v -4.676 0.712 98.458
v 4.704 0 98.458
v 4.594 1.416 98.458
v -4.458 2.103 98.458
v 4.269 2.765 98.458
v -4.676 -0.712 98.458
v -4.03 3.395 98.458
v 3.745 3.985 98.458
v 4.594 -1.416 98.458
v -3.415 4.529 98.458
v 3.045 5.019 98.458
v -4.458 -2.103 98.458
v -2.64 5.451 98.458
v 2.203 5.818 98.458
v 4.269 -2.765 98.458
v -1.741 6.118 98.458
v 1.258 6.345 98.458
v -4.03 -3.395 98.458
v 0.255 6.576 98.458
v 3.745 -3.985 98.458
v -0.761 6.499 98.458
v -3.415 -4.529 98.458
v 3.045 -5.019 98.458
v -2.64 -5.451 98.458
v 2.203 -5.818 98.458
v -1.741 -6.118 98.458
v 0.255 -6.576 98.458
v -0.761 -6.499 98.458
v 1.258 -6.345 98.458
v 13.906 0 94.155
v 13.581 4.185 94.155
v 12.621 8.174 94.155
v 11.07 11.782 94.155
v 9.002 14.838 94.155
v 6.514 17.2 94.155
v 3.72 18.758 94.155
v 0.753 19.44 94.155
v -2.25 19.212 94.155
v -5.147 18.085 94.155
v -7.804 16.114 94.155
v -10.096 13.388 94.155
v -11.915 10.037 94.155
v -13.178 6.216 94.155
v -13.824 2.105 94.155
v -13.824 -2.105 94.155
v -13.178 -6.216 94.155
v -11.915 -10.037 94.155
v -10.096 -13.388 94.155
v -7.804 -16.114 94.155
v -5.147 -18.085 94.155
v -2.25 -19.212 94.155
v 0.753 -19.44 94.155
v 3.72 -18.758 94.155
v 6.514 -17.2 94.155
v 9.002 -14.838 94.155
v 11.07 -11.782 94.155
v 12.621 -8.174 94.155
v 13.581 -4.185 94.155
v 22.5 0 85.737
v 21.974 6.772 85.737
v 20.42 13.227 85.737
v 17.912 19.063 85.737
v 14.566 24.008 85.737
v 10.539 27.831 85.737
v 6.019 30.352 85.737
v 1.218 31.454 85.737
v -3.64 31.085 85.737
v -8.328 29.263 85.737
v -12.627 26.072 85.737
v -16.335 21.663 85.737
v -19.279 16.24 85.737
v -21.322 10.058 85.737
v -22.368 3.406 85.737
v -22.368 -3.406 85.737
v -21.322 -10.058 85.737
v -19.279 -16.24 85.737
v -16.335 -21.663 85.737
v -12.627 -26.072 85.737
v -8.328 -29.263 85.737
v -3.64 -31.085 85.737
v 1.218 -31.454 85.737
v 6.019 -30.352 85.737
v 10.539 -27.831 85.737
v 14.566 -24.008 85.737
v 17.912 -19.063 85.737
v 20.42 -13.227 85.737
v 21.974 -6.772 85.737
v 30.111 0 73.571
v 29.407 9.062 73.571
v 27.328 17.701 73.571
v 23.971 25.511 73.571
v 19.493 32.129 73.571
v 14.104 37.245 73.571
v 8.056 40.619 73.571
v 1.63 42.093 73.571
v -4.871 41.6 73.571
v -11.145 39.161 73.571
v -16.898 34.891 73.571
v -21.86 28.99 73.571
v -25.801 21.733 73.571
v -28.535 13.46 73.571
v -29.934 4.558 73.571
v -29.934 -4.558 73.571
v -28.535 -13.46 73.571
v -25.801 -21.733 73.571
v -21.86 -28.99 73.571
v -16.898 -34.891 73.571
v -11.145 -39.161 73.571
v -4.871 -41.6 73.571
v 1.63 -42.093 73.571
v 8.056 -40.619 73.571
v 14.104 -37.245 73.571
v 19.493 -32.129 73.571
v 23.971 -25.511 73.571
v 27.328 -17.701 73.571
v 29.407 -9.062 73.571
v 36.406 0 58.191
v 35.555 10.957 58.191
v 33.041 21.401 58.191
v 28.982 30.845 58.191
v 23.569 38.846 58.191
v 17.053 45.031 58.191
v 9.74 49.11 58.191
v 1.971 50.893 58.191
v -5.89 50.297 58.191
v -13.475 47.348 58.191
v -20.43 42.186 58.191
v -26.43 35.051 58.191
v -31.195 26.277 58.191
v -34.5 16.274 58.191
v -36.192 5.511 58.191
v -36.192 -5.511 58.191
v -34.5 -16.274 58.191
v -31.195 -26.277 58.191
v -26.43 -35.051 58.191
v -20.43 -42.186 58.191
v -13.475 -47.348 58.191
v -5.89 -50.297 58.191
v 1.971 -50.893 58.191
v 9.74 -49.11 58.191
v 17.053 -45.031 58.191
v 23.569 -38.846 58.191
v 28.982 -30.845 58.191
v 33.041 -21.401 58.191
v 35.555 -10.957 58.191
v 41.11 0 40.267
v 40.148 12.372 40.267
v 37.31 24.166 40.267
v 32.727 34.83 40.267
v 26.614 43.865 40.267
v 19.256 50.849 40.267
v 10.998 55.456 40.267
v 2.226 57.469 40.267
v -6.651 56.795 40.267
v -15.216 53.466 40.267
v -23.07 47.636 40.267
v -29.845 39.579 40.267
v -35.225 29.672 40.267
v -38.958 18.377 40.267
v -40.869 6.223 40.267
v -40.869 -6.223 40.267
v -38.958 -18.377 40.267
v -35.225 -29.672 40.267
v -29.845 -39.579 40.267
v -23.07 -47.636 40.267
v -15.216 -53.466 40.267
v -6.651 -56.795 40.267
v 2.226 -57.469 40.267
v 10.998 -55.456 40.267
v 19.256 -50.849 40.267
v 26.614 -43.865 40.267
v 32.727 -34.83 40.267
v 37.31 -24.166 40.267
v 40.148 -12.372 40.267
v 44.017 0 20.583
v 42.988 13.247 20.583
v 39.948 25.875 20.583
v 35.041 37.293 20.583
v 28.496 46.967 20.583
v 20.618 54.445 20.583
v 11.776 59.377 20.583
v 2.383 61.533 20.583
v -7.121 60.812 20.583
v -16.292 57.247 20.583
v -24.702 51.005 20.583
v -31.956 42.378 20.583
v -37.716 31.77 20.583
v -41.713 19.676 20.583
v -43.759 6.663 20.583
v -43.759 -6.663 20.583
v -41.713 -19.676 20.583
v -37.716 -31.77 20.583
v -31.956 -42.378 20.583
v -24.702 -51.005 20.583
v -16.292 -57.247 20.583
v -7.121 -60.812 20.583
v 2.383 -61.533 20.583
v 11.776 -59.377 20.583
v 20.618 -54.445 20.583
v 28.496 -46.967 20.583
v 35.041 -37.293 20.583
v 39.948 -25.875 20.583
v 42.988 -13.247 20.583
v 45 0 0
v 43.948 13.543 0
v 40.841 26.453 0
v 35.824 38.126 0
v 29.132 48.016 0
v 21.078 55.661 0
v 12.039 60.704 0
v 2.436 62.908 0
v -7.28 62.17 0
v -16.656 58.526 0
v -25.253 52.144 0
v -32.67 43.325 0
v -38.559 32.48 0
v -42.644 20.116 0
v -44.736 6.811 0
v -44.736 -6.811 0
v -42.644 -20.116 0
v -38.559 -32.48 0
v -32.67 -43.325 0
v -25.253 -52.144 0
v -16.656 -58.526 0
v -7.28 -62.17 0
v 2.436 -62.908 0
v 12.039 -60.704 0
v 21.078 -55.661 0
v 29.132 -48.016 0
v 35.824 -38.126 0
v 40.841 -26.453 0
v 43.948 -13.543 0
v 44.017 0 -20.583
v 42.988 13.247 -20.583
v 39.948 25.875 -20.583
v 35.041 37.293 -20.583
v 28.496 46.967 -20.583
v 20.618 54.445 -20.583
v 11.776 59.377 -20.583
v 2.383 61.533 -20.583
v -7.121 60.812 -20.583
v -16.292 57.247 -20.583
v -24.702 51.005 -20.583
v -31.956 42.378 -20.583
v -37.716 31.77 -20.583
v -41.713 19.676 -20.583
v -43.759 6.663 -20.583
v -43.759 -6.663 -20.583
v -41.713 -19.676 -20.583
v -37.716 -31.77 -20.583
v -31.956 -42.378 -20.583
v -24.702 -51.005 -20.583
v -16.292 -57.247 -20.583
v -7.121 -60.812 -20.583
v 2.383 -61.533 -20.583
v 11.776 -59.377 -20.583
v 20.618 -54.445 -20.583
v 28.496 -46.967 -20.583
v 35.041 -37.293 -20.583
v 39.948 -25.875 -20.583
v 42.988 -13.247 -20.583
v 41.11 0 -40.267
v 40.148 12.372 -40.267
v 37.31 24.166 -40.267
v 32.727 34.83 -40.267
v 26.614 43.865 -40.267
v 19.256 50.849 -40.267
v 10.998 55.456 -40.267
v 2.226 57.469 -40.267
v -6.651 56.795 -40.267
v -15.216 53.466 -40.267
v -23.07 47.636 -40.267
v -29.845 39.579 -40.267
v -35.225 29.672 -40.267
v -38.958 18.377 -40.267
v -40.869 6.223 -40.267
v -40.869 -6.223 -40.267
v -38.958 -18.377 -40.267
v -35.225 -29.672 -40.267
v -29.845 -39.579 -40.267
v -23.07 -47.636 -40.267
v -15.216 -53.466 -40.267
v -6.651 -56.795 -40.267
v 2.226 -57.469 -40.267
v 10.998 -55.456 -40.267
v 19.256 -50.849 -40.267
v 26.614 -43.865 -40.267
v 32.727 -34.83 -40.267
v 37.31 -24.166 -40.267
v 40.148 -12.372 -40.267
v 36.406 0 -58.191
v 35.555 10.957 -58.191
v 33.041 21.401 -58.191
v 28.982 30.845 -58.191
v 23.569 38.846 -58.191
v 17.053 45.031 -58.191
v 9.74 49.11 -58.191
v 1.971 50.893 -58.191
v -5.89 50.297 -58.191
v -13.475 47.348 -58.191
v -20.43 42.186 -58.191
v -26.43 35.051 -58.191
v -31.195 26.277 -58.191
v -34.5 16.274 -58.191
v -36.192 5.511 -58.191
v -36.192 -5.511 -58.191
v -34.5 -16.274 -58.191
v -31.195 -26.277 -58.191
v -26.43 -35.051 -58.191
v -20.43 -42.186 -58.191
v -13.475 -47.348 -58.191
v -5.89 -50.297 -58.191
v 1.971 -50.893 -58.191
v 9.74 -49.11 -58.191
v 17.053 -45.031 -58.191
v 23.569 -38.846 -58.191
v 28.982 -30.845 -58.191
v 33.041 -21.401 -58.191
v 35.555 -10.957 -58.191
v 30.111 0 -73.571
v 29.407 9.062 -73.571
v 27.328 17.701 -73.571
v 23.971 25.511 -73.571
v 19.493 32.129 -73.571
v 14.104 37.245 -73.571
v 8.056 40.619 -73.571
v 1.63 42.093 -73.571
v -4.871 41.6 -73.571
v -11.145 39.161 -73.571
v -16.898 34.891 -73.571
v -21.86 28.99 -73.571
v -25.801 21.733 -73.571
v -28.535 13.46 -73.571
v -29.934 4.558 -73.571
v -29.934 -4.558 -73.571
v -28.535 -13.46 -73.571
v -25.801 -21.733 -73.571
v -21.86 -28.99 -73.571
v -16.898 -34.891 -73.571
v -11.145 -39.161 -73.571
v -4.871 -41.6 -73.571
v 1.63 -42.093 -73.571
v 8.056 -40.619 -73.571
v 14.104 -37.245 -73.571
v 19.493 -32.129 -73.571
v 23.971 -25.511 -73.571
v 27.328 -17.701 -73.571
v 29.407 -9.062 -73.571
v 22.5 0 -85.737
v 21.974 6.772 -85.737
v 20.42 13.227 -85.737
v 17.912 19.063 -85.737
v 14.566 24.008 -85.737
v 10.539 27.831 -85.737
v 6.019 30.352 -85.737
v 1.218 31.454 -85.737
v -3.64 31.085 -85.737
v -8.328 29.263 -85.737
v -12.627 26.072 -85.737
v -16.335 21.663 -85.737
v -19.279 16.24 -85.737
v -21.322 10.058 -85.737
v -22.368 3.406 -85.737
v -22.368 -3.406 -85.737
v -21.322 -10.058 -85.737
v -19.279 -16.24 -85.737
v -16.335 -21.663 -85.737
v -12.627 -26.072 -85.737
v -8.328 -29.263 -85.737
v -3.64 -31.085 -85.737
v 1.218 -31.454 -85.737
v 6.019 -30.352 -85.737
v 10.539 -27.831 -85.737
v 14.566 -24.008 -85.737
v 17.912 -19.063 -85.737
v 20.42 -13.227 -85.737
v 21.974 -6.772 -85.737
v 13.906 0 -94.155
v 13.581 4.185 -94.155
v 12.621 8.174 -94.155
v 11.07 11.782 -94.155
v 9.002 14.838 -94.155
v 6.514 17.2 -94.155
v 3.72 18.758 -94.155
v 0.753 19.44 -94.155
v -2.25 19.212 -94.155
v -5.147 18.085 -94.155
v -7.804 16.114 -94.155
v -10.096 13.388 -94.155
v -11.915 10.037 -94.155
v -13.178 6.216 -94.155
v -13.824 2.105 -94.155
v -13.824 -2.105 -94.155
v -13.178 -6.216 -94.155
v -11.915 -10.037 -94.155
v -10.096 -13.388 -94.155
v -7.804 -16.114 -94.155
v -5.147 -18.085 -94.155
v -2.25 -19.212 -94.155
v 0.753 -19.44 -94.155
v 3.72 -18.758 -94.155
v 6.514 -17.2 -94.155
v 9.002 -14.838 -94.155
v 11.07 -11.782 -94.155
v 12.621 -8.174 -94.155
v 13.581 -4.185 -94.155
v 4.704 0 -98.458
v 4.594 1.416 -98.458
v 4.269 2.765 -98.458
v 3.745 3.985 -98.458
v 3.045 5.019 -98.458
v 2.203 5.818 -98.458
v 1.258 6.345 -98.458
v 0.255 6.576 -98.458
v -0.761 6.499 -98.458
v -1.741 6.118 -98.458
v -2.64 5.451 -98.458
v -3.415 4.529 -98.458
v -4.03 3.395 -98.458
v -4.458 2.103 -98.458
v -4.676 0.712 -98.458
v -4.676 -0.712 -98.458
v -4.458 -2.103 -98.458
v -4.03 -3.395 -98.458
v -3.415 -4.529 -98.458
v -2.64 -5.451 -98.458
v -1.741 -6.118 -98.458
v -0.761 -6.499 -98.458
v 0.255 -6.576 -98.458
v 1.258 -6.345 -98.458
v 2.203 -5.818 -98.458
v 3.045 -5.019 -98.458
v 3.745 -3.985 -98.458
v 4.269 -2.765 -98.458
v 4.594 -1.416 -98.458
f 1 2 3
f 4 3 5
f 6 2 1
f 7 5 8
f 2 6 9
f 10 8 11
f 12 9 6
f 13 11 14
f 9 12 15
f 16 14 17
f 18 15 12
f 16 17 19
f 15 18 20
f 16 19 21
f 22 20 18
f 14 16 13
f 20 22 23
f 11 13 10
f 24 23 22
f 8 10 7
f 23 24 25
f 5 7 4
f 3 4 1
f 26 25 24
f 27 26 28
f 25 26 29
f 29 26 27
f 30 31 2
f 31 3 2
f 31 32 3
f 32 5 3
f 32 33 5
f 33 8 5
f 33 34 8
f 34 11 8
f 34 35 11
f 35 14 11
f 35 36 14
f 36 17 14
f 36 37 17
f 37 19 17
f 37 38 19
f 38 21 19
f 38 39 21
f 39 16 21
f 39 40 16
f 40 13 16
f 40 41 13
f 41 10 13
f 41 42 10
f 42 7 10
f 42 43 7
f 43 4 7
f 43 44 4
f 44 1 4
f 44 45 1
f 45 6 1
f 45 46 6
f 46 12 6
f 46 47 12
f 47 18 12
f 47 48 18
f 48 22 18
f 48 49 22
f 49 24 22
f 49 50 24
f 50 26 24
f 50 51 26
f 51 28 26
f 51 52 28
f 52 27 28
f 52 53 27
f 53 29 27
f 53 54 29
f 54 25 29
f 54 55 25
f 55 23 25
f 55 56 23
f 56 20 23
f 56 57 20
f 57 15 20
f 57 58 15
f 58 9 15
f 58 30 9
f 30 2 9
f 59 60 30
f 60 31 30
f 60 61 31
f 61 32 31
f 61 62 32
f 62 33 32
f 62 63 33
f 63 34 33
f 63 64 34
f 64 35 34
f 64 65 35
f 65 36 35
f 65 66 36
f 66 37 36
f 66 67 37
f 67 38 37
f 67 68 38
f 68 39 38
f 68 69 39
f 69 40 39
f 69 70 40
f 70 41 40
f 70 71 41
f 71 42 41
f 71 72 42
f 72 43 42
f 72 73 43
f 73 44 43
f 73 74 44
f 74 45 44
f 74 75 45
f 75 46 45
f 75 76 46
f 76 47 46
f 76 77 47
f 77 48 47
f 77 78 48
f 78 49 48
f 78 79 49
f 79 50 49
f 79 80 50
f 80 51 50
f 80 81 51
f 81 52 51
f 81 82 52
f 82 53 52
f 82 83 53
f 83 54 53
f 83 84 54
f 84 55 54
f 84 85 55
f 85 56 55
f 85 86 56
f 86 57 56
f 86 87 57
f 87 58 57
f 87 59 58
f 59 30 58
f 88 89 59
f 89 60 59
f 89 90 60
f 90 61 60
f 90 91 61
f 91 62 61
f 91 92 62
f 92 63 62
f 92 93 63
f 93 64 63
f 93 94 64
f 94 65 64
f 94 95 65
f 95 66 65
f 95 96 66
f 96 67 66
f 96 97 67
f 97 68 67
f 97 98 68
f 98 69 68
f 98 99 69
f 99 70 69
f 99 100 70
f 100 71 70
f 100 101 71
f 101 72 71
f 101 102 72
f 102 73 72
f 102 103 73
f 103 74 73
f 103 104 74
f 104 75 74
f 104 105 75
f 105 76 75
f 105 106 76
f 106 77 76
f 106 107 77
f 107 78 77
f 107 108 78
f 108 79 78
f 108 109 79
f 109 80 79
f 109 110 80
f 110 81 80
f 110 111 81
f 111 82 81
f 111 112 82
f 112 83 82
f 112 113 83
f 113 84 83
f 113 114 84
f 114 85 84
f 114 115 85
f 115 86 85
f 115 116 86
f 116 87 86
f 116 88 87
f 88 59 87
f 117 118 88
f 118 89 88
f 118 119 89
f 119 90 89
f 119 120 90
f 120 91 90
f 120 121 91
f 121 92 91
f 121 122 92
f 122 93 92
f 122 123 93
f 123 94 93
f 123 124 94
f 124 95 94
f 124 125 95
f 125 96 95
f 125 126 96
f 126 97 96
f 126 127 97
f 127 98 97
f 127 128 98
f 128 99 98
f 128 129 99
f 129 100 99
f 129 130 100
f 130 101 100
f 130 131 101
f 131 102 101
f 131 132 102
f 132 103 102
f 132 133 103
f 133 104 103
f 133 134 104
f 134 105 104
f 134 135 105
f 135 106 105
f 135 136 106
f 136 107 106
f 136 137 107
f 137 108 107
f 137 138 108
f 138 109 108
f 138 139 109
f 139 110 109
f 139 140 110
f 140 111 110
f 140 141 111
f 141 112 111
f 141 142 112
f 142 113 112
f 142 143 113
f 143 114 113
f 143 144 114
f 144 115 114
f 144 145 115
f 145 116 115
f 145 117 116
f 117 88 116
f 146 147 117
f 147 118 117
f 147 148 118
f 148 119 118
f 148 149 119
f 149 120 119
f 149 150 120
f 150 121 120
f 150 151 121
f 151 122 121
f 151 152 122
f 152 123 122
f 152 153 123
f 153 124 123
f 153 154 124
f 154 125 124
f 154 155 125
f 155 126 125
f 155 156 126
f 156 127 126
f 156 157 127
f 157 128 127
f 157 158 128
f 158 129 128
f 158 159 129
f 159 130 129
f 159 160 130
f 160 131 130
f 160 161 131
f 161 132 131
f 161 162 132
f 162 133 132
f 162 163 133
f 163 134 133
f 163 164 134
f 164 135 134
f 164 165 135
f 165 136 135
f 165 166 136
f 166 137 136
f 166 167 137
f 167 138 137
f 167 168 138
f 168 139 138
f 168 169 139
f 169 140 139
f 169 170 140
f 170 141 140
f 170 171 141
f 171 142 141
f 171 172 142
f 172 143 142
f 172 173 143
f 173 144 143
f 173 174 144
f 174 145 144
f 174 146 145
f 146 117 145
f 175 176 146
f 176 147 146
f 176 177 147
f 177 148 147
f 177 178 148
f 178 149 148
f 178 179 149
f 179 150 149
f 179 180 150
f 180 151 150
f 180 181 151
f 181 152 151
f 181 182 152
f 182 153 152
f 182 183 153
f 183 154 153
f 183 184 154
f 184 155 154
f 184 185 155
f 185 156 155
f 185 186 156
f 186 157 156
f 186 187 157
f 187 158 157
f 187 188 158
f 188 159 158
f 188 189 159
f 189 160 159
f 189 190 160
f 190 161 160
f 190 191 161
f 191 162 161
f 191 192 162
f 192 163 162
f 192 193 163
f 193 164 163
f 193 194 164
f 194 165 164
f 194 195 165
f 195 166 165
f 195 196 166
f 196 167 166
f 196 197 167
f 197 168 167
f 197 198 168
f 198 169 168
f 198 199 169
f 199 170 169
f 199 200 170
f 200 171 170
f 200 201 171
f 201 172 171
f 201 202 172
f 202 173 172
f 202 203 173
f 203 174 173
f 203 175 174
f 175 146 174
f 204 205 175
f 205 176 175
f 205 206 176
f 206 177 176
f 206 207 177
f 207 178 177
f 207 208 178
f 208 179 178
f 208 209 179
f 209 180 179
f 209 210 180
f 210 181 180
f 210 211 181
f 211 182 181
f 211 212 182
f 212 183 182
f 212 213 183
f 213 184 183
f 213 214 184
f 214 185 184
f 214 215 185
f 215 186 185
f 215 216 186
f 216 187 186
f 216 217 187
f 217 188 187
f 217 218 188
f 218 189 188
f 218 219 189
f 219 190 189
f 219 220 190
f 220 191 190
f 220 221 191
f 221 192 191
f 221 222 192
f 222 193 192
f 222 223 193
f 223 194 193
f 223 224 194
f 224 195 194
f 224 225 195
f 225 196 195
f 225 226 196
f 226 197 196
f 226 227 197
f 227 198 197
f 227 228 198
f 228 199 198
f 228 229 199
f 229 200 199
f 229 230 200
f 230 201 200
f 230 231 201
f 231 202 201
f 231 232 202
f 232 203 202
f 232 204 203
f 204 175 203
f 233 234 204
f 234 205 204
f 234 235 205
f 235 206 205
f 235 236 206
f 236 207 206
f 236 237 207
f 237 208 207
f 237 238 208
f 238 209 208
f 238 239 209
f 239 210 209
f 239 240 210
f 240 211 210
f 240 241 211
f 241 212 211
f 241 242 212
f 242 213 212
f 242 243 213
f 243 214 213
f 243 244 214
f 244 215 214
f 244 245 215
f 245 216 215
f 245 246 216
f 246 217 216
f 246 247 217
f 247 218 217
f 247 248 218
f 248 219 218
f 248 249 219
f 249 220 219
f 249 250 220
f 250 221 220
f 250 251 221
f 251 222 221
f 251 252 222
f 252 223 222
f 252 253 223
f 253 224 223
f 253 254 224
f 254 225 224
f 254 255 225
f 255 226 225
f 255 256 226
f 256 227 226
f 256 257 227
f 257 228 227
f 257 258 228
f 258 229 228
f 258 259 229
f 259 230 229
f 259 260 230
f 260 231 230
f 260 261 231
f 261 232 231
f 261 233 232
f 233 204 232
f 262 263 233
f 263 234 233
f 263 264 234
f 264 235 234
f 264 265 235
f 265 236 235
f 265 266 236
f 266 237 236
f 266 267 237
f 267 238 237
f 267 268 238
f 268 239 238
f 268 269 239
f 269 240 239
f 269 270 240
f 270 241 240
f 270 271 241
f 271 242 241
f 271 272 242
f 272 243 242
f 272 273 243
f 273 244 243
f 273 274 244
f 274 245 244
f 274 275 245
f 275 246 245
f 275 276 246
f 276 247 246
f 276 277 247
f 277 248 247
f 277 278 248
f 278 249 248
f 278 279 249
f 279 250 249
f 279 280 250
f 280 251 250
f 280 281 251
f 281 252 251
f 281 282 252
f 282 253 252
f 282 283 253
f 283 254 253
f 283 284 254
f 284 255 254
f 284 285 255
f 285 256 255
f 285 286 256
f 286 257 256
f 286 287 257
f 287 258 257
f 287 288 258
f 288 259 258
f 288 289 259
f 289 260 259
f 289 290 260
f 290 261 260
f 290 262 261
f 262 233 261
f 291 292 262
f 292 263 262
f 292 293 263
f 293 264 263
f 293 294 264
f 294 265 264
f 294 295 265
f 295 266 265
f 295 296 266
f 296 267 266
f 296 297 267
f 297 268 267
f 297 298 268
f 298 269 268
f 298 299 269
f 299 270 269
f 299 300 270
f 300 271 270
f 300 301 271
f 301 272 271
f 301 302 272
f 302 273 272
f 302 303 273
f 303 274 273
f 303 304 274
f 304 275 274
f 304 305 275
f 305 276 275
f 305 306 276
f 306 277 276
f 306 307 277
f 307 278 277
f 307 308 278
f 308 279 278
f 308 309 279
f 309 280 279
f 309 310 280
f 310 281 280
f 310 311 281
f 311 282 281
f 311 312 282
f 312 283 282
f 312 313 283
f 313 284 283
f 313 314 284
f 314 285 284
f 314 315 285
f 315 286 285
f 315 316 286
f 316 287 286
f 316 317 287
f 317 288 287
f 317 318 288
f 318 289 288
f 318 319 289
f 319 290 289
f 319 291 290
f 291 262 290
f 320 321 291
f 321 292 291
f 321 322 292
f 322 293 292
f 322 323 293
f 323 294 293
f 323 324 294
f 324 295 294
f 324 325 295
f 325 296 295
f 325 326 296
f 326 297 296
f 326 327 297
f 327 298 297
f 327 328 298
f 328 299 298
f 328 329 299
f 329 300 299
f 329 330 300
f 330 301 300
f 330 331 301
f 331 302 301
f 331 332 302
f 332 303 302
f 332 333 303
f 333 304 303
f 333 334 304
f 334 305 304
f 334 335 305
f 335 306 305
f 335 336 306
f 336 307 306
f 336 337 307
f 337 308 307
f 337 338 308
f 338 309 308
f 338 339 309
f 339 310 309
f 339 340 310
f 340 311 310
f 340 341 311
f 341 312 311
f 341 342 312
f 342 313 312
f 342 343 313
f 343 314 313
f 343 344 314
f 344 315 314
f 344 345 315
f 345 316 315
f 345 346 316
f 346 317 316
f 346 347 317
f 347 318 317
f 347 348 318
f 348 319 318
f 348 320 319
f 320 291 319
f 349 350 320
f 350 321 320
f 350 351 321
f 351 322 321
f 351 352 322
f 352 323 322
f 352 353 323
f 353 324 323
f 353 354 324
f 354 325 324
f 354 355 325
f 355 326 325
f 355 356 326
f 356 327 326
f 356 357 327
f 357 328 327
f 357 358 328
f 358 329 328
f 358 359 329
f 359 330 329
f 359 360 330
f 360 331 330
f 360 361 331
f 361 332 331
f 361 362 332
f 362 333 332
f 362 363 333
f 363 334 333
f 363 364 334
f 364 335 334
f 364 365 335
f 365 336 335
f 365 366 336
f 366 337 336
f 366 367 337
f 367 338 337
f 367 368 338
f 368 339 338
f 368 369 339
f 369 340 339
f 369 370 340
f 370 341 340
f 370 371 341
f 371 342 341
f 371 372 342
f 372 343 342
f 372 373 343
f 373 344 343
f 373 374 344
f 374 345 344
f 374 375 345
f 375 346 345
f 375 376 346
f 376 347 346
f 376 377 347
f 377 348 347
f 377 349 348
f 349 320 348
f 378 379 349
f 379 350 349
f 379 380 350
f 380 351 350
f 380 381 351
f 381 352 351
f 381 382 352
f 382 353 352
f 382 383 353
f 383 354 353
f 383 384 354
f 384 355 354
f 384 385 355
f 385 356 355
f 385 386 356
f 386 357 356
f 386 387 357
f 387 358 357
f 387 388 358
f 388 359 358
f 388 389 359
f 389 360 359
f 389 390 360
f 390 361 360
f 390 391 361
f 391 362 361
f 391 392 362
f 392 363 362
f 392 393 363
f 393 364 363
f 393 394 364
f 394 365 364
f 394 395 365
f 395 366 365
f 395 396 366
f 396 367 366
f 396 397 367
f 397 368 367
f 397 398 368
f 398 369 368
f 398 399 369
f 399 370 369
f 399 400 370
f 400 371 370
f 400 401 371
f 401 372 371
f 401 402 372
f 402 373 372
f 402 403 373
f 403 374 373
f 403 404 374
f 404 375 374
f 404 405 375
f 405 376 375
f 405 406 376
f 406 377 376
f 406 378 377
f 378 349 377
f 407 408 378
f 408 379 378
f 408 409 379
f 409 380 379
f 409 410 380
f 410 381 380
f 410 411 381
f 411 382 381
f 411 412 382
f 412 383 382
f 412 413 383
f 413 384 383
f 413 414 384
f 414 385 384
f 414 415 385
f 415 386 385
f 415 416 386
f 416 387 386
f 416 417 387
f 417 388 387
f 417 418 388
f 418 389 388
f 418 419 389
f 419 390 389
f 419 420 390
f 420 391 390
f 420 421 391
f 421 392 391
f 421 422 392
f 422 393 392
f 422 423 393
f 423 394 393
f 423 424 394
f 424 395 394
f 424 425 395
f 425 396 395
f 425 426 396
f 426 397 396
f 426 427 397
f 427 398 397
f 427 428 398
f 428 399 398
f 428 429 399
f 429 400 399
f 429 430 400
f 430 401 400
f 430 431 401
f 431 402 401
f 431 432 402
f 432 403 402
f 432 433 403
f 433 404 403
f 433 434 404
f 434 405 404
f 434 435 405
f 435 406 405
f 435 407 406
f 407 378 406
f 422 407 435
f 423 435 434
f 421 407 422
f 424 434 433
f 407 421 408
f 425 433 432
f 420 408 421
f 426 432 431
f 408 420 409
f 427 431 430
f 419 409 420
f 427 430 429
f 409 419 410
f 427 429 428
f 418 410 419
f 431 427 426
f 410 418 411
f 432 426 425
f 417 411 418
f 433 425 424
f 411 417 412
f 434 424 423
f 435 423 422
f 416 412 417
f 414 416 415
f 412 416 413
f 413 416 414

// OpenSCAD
// Generated by SolidPython 1.0.1 on 2020-07-29 00:46:46


scale(v = [5, 7, 11]) {
	sphere(r = 9);
}
/***********************************************
*********      SolidPython code:      **********
************************************************
 
# import packages: SolidPython
from solid import *
from solid.utils import *
from itertools import chain, combinations, permutations


class Resize:

    def __init__(self, scad_file):
        self.scad_file = scad_file
        #self.scad_file = import_scad(scad_file)
        # cone/cylinder param:
        self.r1 = 0
        self.r2 = 0
        self.h = 0
        # rectangular prism param:
        self.w = 0
        self.l = 0
        # ellipse param:
        self.r = 0

    # import OpenScad code (file name corresponds to shape)


    # classify shape + parameters
    def assign(self, param1, param2, param3):
        if self.scad_file == 'cone.scad':
            self.r1 = param1
            self.r2 = param2
            self.h = param3
        elif self.scad_file == 'cylinder.scad':
            self.r1 = param1
            self.r2 = param2
            self.h = param3
        elif self.scad_file == 'rectangularPrism.scad':
            self.h = param1
            self.l = param2
            self.w = param3
        else:
            self.r = param1
            self.h = param2

    # resize parameters
    def iterate(self):
        x = range(3, 20, 2)
        i = 1
        if self.scad_file == 'cone.scad':
            tempList = list(permutations(x, 2))
            for temp in tempList:
                param1 = temp[0]
                param2 = temp[1]
                filepath = 'produced_scad_files/' + 'cone' + str(param1) + '_' + str(param2) + '_' + '.scad'
                scad_render_to_file(cylinder(h=param1, r1=param2, r2=0), filepath)

        elif self.scad_file == 'cylinder.scad':
            tempList = list(permutations(x, 3))
            for temp in tempList:
                param1 = temp[0]
                param2 = temp[1]
                filepath = 'produced_scad_files/' + 'cylinder' + str(param1) + '_' + str(param2) + '_' + '.scad'
                scad_render_to_file(cylinder(h=param1, r1=param2, r2=param2), filepath)

        elif self.scad_file == 'rectangularPrism.scad':
            tempList = list(permutations(x, 3))
            for temp in tempList:
                param1 = temp[0]
                param2 = temp[1]
                param3 = temp[2]
                filepath = 'produced_scad_files/' + 'rectangularPrism' + str(param1) + '_' + str(param2) + '_' + str(
                    param3) + '.scad'
                scad_render_to_file(cube(size=(param1, param2, param3)), filepath)

        elif self.scad_file == 'ellipse.scad':
            tempList = list(permutations(x, 4))
            for temp in tempList:
                param1 = temp[0]
                param2 = temp[1]
                param3 = temp[2]
                param4 = temp[3]
                filepath = 'produced_scad_files/' + 'ellipse' + str(param1) + '_' + str(param2) + '_' + str(param3) + '_' + str(param4) + '.scad'
                scad_render_to_file(scale([param1, param2, param3])(sphere(r=param4)), filepath)

    def render_to_scadfile(self):
        scad_render_to_file(scad, 'example.scad') 
 
************************************************/
